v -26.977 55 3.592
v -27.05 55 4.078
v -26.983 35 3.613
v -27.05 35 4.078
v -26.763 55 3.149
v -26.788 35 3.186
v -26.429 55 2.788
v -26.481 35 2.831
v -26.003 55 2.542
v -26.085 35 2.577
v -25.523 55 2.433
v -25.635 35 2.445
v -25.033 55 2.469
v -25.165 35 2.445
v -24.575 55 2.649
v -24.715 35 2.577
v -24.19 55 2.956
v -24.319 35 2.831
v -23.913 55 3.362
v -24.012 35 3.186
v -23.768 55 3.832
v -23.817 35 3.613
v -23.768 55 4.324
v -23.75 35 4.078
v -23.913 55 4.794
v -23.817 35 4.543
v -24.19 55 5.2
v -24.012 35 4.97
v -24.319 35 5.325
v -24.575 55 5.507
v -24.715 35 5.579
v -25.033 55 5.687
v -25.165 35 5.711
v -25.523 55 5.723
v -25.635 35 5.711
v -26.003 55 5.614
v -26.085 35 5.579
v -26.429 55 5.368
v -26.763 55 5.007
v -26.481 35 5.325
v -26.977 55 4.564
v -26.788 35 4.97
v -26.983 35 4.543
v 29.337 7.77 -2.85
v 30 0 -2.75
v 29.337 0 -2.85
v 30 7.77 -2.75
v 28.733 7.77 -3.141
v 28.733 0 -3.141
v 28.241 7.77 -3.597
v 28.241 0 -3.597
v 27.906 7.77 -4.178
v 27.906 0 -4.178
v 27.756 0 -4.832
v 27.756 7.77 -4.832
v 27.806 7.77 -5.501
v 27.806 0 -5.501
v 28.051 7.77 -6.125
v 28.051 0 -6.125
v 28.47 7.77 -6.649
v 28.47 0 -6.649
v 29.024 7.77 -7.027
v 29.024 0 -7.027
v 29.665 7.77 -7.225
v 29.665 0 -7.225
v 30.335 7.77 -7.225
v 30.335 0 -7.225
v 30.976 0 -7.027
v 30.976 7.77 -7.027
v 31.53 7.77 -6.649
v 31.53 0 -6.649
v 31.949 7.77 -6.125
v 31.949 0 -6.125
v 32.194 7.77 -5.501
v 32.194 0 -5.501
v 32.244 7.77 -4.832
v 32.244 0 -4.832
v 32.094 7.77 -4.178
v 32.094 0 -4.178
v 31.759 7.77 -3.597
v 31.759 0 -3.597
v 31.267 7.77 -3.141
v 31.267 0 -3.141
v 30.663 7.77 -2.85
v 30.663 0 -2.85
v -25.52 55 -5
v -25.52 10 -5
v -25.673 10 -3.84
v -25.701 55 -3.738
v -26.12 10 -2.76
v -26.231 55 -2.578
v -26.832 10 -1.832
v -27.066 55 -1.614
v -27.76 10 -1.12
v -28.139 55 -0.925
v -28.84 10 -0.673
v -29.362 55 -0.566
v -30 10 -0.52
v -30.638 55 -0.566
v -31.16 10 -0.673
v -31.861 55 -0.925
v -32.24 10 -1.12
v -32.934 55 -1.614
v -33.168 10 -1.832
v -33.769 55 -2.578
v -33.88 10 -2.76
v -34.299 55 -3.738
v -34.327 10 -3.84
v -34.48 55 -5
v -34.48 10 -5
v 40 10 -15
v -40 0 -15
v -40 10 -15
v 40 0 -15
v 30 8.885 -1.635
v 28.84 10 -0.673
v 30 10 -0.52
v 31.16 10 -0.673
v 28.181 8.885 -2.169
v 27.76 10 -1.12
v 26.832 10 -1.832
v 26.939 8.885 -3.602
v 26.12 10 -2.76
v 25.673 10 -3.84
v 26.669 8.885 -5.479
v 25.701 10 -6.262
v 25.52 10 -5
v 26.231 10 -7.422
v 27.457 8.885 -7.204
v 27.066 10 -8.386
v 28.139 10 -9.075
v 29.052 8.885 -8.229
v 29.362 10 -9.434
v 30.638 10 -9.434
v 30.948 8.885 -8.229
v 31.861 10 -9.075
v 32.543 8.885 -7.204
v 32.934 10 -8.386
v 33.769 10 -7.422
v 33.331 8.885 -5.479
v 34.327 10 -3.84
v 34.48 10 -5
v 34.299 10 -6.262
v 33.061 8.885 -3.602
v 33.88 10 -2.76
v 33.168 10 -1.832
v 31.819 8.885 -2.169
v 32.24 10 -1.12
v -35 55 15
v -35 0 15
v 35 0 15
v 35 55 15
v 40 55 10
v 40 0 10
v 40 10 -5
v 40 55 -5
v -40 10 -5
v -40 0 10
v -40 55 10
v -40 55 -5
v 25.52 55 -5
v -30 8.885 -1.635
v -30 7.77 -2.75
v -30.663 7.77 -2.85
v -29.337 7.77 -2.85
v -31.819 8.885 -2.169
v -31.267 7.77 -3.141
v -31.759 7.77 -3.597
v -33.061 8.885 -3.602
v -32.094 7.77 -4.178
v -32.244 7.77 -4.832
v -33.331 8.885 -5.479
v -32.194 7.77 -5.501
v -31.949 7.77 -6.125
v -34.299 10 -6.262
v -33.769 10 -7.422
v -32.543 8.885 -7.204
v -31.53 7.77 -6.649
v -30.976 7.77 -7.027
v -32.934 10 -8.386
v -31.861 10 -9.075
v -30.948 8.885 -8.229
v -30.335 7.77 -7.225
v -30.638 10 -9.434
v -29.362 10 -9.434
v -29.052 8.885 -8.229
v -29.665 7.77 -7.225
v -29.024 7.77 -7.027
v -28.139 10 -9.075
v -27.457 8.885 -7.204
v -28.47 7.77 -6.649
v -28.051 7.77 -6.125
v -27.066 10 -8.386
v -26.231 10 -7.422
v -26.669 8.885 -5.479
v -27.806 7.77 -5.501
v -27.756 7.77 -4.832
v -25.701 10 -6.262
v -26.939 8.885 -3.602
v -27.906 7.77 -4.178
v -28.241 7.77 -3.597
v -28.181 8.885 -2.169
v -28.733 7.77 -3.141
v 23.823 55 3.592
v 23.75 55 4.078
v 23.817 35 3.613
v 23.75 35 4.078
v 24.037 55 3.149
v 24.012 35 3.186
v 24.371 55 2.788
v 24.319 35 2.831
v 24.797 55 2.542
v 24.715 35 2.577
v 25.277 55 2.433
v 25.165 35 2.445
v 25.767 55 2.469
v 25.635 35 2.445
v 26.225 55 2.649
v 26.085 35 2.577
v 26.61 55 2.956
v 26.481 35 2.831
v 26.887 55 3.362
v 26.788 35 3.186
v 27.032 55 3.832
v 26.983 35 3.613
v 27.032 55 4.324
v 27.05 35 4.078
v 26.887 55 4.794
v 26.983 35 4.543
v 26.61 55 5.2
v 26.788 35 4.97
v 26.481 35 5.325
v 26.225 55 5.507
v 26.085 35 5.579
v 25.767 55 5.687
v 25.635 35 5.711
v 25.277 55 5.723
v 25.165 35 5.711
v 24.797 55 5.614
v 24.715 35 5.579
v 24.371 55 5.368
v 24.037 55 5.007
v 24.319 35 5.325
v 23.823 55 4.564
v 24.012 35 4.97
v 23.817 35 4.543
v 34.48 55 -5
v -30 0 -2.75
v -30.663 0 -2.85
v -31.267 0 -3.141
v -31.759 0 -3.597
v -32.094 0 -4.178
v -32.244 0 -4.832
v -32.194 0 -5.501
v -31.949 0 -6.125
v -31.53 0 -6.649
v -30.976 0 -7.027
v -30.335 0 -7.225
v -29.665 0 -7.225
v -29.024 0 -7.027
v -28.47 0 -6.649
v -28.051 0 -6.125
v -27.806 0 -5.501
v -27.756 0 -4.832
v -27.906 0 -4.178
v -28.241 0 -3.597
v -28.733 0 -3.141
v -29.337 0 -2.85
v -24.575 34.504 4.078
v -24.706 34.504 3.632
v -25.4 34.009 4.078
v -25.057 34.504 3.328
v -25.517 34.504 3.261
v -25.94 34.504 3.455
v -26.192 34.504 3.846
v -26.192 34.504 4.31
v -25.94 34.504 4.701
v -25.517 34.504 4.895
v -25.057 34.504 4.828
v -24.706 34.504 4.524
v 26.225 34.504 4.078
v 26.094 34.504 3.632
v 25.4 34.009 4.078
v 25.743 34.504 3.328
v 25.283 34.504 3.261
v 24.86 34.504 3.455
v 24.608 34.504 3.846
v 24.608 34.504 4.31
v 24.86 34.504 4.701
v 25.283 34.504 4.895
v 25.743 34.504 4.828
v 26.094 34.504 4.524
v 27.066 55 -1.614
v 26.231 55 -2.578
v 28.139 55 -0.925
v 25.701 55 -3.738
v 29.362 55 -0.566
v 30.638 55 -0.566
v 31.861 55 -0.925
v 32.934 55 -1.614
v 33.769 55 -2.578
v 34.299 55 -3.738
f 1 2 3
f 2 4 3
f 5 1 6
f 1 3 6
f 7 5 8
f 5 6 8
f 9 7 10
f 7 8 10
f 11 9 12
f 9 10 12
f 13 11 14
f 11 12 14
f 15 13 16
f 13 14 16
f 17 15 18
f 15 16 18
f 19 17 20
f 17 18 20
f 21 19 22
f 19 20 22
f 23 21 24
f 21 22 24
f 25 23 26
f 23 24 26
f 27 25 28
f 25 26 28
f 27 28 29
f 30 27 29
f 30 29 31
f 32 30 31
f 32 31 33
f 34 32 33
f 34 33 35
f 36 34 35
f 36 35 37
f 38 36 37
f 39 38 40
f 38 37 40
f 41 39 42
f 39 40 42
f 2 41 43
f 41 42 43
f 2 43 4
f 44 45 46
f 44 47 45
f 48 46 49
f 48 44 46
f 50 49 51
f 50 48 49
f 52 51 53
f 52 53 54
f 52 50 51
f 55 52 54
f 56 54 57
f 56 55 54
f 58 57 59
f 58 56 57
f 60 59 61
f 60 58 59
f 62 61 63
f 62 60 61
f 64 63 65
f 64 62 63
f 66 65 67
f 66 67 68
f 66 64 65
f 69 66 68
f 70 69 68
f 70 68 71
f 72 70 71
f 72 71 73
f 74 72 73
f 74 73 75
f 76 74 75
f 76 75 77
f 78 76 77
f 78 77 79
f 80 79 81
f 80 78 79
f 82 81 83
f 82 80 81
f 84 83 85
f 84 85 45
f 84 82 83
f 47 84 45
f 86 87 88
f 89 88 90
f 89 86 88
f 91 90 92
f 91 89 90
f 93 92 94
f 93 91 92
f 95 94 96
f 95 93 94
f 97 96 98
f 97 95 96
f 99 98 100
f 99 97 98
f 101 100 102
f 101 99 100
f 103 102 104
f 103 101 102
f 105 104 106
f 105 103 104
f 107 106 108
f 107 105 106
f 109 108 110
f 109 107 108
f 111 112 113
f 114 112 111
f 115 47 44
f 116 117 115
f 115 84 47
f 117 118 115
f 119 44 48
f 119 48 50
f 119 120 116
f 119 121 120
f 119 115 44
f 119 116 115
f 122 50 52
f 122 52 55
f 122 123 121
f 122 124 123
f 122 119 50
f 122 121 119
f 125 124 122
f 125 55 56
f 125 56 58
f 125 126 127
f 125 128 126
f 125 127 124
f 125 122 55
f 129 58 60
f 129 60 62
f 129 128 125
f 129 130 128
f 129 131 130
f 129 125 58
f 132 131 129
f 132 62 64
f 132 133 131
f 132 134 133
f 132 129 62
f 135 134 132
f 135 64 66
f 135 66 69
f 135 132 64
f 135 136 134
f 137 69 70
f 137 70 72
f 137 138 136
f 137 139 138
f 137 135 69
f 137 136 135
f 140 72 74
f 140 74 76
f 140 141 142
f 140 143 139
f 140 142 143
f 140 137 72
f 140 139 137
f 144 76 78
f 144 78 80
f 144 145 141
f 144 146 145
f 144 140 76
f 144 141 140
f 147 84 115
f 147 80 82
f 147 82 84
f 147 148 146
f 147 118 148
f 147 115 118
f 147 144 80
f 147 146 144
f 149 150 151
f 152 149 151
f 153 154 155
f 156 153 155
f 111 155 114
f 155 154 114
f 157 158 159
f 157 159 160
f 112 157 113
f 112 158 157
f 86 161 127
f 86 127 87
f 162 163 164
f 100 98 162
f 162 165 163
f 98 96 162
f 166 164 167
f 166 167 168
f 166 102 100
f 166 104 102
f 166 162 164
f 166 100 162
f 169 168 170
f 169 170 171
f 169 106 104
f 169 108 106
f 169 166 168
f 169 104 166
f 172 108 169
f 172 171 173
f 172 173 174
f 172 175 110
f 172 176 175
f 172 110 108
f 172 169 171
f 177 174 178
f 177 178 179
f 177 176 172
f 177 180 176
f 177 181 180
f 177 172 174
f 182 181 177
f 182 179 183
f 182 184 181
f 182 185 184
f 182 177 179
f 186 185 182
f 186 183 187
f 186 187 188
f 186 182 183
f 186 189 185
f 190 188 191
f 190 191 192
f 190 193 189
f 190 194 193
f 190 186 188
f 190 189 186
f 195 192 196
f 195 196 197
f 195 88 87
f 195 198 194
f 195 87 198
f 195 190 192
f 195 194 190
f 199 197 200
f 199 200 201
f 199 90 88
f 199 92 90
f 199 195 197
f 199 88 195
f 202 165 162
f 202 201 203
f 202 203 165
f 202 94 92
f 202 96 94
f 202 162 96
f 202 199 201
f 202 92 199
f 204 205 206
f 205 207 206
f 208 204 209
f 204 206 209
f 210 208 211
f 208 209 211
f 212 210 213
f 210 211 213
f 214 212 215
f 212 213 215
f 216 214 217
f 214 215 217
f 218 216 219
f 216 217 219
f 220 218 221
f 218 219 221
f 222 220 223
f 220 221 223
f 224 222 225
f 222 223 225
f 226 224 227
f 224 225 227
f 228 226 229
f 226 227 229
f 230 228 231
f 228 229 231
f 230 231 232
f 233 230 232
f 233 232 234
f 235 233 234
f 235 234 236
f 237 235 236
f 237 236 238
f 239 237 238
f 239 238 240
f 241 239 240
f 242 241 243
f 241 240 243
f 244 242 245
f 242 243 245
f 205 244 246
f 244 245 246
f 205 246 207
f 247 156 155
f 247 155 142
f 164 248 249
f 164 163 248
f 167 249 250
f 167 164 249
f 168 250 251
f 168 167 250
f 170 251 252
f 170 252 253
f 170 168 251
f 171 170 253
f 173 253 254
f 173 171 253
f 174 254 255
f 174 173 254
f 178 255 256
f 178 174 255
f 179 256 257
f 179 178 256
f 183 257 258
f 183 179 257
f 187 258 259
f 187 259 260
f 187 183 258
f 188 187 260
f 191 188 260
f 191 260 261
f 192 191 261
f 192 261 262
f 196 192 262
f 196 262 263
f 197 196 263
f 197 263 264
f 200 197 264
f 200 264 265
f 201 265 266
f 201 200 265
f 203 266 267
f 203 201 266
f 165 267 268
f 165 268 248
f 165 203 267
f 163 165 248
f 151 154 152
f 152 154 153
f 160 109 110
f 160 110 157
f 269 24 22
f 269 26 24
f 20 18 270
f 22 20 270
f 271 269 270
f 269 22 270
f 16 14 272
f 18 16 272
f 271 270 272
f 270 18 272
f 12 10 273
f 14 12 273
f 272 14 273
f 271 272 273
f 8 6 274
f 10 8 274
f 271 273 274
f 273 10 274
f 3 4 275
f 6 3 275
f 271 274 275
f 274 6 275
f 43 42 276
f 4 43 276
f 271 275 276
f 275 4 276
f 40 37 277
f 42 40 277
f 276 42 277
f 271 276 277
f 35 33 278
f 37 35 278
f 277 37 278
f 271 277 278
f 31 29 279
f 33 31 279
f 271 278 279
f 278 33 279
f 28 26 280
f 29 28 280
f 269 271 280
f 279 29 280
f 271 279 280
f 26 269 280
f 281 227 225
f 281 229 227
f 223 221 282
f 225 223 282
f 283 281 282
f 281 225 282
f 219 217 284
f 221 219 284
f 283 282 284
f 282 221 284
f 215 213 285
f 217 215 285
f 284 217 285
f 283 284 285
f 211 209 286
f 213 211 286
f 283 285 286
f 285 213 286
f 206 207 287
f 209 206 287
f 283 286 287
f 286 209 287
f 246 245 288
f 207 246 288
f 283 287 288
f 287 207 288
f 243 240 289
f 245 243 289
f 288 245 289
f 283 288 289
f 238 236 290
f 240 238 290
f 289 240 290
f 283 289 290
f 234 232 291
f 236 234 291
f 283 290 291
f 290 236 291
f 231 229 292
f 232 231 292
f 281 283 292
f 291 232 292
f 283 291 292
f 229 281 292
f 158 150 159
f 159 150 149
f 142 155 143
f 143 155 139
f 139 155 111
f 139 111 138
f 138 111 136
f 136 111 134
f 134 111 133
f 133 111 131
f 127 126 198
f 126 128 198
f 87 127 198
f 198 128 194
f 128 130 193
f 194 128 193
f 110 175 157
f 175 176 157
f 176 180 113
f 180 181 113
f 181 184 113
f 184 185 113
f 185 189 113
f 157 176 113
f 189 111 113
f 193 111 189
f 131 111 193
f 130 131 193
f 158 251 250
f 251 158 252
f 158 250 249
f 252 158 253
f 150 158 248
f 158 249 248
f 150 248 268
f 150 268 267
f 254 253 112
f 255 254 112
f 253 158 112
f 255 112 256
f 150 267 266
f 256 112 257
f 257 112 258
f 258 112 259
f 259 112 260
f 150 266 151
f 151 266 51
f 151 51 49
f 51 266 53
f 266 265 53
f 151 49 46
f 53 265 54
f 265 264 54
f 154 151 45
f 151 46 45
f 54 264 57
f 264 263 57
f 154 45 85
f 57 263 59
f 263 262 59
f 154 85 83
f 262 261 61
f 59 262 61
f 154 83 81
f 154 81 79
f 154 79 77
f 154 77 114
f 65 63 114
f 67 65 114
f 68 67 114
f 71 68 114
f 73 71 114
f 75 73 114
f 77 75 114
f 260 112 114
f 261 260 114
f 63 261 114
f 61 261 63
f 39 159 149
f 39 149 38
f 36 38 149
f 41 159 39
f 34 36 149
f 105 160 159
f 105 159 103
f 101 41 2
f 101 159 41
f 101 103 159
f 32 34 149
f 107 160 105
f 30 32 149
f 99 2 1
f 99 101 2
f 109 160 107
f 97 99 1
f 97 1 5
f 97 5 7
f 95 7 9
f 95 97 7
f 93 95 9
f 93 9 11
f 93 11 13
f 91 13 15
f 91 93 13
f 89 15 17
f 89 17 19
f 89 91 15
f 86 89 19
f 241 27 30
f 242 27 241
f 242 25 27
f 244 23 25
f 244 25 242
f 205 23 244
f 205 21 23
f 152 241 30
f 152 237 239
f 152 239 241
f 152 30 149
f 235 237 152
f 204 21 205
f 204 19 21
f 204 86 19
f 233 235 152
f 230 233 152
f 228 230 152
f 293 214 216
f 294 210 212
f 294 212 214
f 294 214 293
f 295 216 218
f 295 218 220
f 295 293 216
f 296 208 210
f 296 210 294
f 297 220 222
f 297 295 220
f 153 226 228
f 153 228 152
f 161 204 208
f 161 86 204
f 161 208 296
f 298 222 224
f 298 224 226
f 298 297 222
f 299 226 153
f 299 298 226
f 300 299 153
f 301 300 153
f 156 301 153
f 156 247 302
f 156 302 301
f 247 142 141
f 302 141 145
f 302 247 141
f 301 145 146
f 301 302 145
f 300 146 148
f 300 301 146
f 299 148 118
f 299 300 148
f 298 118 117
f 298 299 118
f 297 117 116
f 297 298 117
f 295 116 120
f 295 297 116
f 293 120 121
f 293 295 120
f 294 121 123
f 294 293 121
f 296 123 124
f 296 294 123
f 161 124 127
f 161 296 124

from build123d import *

# Parameters (mm, degrees)
SKETCH1_W                    = 80
SKETCH1_H                    = 30
BOSS_EXTRUDE1_DEPTH          = 55
CSK_FOR_M4_SFHCS1_AT_2_COUNT = 2
CSK_FOR_M4_SFHCS1_AT_2_PITCH = 60
M4X0_7_TAPPED_HOLE1_D        = 3.3
M4X0_7_TAPPED_HOLE1_DEPTH    = 20
M4X0_7_TAPPED_HOLE1_TIP      = 0.991420021
CHAMFER1_SIZE                = 5
SKETCH9_W                    = 80
SKETCH9_H                    = 45
CUT_EXTRUDE1_DEPTH           = 10


with BuildPart() as part:
    # Sketch1 → Boss-Extrude1 (new body)
    with BuildSketch(Plane(origin=(0, 0, 0), x_dir=(1, 0, 0), z_dir=(0, 1, 0))):
        Rectangle(SKETCH1_W, SKETCH1_H)
    extrude(amount=BOSS_EXTRUDE1_DEPTH)

    # Sketch5 → CSK for M4 SFHCS1 (revolve, cut)
    with BuildSketch(Plane(origin=(-30, 55, -5), x_dir=(0, 0, 1), z_dir=(1, 0, 0))):
        Polygon((0, 0), (0, 55), (2.25, 55), (2.25, 47.23), (4.48, 45), (4.48, 0), align=None)
    csk_for_m4_sfhcs1 = revolve(axis=Axis((-30, 61.35, -5), (0, -1, 0)), mode=Mode.SUBTRACT)

    # CSK for M4 SFHCS1 at 2: CSK for M4 SFHCS1 ×2
    with Locations(*[(i * CSK_FOR_M4_SFHCS1_AT_2_PITCH, 0, 0) for i in range(1, CSK_FOR_M4_SFHCS1_AT_2_COUNT)]):
        add(csk_for_m4_sfhcs1, mode=Mode.SUBTRACT)

    # M4x0.7 Tapped Hole1
    with Locations(Plane(origin=(0, 55, 0), x_dir=(1, 0, 0), z_dir=(0, 1, 0))):
        with Locations((-25.4, -4.078), (25.4, -4.078)):
            Hole(M4X0_7_TAPPED_HOLE1_D / 2, depth=M4X0_7_TAPPED_HOLE1_DEPTH)
            with Locations((0, 0, -(M4X0_7_TAPPED_HOLE1_DEPTH + M4X0_7_TAPPED_HOLE1_TIP / 2))):  # 118° drill point
                Cone(0, M4X0_7_TAPPED_HOLE1_D / 2, M4X0_7_TAPPED_HOLE1_TIP, mode=Mode.SUBTRACT)

    # Chamfer1
    chamfer1_edges = [part.edges().sort_by_distance(p)[0] for p in [
        (40, 27.5, 15),
        (-40, 27.5, 15),
    ]]
    chamfer(chamfer1_edges, length=CHAMFER1_SIZE)

    # Sketch9 → Cut-Extrude1 (cut)
    with BuildSketch(Plane(origin=(0, 0, -15), x_dir=(-1, 0, 0), z_dir=(0, 0, -1))):
        with Locations((0, 32.5)):
            Rectangle(SKETCH9_W, SKETCH9_H)
    extrude(amount=-CUT_EXTRUDE1_DEPTH, mode=Mode.SUBTRACT)


solid = part.part
